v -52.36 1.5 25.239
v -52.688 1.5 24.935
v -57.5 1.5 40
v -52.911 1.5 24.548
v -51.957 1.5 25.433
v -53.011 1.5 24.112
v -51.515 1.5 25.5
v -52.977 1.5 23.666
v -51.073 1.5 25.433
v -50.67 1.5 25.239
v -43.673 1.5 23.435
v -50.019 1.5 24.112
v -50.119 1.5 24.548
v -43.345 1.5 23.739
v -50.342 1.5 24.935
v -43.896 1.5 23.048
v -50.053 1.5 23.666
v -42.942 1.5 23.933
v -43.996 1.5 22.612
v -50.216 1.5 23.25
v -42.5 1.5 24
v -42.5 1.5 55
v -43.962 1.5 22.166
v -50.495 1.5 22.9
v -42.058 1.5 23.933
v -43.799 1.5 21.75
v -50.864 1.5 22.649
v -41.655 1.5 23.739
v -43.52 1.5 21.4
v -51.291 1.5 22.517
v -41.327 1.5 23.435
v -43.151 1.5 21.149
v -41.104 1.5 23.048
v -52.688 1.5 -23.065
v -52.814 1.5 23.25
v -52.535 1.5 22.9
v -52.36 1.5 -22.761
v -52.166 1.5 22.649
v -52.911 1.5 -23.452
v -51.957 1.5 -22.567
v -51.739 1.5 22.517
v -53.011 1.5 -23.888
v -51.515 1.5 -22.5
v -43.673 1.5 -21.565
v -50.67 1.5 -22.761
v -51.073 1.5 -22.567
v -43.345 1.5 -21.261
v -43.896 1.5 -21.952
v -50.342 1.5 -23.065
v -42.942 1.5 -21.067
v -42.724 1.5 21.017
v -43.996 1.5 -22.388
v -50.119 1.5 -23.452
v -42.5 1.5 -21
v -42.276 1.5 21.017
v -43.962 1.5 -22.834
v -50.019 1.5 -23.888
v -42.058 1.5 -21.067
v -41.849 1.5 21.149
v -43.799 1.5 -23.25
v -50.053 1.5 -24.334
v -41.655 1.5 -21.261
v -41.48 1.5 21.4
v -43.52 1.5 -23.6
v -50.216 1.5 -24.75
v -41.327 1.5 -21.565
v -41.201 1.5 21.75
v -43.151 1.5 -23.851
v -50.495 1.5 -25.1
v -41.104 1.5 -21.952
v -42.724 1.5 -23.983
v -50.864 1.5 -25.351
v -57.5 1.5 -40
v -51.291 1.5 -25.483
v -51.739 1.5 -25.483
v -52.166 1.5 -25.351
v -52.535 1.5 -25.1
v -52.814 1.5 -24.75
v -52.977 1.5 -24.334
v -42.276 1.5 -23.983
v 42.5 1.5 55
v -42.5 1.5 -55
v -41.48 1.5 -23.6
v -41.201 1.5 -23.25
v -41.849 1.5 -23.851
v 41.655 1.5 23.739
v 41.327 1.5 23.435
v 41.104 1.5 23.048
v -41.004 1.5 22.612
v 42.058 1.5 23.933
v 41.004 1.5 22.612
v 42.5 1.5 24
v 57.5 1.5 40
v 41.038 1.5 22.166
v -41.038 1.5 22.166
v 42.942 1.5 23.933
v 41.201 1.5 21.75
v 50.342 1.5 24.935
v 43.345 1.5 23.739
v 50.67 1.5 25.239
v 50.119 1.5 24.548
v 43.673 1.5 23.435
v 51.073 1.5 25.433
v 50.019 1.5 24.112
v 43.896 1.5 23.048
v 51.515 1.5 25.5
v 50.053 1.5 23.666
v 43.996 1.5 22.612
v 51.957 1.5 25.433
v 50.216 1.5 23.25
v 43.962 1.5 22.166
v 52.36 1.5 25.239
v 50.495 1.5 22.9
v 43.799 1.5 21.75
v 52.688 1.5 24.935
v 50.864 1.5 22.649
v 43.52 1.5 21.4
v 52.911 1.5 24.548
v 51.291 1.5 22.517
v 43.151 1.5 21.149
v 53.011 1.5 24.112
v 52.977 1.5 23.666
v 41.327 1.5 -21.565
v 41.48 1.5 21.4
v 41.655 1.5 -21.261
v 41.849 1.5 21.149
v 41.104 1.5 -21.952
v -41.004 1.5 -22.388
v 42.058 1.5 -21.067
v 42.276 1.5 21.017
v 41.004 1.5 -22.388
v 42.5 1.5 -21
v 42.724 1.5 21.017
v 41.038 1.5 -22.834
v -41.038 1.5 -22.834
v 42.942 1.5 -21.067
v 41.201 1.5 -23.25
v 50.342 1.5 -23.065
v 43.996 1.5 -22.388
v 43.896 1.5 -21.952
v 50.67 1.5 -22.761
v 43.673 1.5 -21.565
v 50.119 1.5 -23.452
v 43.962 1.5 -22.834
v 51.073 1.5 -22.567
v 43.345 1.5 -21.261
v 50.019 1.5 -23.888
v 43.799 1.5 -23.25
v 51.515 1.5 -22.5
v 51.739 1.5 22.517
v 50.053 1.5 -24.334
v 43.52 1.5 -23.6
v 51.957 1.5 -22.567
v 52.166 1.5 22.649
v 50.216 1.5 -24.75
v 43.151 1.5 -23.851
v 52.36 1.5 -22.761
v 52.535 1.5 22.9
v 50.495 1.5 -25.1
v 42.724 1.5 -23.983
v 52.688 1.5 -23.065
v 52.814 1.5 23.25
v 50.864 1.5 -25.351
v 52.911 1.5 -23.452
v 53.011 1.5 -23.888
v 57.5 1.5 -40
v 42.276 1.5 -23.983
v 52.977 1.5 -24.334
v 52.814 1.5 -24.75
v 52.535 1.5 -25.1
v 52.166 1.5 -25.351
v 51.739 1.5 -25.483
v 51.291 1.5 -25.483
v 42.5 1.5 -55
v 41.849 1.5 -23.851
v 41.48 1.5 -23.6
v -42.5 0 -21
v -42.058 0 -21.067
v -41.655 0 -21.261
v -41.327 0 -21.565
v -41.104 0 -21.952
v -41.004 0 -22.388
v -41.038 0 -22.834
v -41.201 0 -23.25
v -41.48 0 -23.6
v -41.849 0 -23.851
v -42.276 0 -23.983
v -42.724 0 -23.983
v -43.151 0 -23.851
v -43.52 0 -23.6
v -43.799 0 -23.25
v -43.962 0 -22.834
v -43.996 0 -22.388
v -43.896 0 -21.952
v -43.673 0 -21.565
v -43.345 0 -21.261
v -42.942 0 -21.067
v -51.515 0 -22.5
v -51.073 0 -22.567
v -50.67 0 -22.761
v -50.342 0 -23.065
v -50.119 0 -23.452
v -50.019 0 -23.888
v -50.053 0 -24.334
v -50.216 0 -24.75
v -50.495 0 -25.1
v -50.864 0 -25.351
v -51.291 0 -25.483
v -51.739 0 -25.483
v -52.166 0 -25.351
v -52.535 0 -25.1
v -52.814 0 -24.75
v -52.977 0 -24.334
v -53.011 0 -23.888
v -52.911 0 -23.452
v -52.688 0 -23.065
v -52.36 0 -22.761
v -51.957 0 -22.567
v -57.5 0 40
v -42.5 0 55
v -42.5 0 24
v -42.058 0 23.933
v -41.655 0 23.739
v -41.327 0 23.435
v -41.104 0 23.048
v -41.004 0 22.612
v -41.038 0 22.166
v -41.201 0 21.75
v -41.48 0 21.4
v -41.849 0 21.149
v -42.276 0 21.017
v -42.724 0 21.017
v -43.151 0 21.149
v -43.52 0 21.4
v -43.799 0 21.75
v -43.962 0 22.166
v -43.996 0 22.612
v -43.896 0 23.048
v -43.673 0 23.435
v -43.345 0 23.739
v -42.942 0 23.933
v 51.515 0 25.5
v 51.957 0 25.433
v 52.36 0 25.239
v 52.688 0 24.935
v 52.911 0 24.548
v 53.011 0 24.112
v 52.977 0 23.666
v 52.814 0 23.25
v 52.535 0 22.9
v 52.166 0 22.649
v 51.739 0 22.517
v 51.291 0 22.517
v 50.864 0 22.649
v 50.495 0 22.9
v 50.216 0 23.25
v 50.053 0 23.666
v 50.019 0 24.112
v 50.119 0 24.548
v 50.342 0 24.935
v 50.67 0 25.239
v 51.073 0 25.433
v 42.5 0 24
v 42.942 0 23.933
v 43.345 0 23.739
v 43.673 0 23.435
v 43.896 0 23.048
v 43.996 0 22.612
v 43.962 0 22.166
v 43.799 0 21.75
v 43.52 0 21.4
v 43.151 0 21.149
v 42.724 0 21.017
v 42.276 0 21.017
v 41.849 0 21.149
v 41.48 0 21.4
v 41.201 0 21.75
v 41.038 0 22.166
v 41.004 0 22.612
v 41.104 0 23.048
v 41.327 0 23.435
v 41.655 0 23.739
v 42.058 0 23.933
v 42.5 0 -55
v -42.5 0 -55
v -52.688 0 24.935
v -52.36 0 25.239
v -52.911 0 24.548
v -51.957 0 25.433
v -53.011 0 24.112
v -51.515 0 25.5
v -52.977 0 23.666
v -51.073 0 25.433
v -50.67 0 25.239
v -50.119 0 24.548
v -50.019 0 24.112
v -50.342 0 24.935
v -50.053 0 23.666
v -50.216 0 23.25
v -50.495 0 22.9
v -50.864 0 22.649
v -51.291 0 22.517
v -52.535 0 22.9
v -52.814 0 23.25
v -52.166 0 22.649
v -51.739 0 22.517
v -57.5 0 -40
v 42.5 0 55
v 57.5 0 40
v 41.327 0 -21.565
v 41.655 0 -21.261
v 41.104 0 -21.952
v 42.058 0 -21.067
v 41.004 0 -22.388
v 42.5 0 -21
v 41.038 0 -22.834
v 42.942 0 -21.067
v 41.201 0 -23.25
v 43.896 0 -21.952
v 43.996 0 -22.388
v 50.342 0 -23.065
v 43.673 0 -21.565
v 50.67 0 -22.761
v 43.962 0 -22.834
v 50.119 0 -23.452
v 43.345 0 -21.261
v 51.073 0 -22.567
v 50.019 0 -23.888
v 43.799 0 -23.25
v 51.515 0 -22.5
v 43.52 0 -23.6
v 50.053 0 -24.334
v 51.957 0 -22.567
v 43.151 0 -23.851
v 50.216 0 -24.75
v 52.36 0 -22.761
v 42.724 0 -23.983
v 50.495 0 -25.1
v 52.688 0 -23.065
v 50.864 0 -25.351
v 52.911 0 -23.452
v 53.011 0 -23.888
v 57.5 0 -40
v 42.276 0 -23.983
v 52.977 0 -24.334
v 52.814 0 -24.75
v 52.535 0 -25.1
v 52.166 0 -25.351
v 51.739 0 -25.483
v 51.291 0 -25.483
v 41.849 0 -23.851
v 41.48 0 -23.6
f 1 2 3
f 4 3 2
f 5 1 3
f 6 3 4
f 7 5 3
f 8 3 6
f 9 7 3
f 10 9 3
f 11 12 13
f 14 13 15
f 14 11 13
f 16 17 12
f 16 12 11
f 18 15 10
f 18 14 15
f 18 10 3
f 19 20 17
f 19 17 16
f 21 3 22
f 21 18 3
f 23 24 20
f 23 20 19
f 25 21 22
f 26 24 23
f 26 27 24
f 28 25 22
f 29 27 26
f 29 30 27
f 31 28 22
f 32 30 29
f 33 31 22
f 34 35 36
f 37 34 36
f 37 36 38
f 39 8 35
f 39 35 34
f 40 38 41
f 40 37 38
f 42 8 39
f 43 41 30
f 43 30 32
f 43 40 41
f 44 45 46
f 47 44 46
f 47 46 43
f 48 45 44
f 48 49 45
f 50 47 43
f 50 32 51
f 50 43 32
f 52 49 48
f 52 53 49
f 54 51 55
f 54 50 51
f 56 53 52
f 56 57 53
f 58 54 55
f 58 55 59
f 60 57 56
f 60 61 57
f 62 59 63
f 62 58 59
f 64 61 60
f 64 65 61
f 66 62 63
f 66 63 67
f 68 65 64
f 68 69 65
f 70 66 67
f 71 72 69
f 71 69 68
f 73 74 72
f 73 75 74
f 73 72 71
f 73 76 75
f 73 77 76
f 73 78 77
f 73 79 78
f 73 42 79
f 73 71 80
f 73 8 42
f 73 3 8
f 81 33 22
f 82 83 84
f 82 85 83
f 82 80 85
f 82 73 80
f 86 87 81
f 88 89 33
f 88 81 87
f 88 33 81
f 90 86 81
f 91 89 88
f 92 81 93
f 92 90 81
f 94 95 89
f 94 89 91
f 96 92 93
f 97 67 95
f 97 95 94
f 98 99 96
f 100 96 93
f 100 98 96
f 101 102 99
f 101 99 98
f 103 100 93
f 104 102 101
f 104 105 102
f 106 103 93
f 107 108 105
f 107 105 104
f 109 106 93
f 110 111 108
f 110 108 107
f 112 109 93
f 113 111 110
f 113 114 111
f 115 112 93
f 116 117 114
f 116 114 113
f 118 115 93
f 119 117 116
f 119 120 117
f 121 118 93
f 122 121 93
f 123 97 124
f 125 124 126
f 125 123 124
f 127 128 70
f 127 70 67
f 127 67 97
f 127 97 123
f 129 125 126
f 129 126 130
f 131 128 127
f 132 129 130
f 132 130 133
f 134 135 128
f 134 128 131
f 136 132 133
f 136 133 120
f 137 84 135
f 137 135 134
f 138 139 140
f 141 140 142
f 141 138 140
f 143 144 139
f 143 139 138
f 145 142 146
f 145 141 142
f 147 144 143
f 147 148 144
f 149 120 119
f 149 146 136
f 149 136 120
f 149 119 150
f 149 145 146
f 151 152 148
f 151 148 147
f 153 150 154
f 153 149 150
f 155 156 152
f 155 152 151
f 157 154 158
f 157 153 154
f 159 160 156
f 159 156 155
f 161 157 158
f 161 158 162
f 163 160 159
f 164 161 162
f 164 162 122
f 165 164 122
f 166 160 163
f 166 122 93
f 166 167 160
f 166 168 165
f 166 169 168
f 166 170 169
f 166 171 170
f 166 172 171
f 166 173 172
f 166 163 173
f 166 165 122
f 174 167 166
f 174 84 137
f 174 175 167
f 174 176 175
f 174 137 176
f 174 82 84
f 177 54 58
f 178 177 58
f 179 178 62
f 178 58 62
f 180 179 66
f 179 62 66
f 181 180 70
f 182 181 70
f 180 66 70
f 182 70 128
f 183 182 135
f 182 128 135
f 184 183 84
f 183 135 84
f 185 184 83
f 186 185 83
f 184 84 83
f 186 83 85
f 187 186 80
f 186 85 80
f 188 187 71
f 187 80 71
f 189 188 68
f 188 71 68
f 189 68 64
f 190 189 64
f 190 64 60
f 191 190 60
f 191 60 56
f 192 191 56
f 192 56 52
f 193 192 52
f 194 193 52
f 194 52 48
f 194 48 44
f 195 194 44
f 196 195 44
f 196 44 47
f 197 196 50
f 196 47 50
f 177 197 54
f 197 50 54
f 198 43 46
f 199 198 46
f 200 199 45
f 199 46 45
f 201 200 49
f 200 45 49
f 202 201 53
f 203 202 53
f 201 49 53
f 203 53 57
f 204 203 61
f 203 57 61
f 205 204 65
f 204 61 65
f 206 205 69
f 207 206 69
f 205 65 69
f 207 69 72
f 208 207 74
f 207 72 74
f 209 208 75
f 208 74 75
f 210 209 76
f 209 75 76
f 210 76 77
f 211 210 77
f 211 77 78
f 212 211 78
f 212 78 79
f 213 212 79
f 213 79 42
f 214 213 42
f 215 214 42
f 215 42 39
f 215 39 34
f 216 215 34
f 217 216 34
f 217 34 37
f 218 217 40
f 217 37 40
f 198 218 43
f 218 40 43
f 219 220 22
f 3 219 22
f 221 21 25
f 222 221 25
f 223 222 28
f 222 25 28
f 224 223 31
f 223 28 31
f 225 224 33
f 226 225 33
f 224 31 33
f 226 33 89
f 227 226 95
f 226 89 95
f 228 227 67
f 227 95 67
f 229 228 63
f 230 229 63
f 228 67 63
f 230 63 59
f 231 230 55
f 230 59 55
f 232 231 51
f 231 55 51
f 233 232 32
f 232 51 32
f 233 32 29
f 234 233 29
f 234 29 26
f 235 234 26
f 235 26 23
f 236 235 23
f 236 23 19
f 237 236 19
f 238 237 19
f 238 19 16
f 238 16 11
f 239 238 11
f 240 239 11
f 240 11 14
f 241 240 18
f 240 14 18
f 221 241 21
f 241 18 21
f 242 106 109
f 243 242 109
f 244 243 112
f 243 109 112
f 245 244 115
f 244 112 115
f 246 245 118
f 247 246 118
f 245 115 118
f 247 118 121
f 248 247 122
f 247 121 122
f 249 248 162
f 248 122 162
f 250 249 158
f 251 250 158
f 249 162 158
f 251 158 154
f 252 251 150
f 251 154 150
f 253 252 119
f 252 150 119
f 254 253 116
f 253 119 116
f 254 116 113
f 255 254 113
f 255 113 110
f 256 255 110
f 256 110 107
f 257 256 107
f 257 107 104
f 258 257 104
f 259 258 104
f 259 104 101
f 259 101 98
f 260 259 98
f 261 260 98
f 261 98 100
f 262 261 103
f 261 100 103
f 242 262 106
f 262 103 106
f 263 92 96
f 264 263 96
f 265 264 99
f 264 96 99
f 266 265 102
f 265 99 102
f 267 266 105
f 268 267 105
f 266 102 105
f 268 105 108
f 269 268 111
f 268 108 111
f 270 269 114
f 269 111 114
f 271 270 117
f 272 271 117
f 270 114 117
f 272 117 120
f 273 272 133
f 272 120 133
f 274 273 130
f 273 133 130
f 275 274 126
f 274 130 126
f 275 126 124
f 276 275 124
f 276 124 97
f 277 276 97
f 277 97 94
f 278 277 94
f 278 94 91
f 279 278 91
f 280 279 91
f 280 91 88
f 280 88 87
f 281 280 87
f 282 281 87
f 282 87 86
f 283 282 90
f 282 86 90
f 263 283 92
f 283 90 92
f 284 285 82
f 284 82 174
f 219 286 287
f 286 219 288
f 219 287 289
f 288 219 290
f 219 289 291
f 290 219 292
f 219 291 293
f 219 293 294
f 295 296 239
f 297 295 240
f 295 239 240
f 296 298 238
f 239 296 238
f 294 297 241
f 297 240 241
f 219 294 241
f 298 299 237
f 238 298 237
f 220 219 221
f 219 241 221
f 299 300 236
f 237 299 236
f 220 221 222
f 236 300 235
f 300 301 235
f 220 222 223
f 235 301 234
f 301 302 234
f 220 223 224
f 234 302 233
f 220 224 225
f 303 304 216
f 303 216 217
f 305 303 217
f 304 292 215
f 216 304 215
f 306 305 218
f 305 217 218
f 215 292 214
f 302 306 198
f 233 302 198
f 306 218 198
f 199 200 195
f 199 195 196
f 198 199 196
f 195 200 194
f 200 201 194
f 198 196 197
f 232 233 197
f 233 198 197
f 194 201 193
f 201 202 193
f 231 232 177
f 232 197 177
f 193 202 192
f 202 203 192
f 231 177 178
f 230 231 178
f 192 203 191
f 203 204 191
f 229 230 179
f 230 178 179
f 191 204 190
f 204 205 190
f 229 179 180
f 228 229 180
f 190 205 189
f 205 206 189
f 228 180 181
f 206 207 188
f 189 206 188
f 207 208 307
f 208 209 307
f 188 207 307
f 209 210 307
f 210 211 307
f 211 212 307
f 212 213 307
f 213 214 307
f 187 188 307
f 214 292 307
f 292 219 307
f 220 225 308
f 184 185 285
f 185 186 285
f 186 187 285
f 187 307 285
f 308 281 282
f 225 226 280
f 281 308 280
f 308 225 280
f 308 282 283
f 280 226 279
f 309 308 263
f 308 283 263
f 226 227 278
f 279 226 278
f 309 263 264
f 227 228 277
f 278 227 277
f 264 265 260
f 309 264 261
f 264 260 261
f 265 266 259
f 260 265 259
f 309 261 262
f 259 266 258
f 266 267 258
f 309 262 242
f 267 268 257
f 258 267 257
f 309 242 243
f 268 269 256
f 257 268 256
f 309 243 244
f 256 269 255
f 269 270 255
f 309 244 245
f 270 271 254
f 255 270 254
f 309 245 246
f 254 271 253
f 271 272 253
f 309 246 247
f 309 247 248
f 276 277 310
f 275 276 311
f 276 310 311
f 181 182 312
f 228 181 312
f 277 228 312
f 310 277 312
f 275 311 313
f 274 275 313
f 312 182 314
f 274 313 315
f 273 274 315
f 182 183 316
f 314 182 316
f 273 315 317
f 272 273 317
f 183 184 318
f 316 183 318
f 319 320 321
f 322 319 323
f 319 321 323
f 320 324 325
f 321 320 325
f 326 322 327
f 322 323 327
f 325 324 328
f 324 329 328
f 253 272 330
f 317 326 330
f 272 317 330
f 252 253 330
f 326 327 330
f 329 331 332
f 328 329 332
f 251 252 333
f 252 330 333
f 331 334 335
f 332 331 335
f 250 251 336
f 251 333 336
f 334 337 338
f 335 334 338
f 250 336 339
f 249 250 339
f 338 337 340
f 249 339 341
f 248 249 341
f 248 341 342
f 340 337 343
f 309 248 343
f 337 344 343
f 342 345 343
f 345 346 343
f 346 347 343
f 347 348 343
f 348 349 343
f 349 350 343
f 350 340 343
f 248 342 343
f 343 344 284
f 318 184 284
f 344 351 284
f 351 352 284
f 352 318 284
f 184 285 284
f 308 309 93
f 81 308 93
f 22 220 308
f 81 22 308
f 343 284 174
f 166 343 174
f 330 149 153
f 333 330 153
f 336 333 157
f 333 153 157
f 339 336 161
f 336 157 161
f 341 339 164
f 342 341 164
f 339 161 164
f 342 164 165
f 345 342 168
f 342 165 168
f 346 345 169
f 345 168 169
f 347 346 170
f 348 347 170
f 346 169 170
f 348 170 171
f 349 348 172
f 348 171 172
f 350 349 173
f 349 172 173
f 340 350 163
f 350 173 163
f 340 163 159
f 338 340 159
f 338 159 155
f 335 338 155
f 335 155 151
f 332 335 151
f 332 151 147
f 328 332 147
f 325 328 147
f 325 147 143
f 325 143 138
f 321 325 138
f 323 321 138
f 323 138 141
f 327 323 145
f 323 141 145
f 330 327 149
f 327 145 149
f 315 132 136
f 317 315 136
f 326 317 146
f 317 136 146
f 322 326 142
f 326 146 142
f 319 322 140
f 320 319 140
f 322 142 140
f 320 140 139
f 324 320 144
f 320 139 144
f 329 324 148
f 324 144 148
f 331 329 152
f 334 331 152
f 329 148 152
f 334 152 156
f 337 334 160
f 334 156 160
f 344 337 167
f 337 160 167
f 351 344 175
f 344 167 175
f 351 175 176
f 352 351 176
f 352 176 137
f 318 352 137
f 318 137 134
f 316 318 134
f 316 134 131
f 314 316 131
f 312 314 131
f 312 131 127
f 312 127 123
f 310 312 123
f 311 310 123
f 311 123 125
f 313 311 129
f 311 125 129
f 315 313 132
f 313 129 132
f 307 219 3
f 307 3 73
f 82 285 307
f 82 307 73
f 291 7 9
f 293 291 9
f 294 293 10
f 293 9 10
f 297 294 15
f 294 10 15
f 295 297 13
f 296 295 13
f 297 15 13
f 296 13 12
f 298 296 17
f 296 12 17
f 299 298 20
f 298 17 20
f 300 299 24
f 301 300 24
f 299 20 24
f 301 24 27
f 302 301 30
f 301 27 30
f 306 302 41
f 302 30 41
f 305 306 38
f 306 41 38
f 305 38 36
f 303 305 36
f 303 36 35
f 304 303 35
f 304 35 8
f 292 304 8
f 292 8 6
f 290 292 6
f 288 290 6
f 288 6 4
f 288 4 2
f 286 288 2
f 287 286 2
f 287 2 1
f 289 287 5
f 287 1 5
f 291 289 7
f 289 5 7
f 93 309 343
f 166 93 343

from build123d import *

# Parameters (mm, degrees)
SKETCH1_W           = 115
SKETCH1_H           = 110
BOSS_EXTRUDE1_DEPTH = 1.5
CHAMFER1_SIZE       = 15
SKETCH3_R           = 1.5
CUT_EXTRUDE1_DEPTH  = 1.5
SKETCH4_R           = 1.5
CUT_EXTRUDE2_DEPTH  = 1.5


with BuildPart() as part:
    # Sketch1 → Boss-Extrude1 (new body)
    with BuildSketch(Plane(origin=(0, 0, 0), x_dir=(1, 0, 0), z_dir=(0, 1, 0))):
        Rectangle(SKETCH1_W, SKETCH1_H)
    extrude(amount=BOSS_EXTRUDE1_DEPTH)

    # Chamfer1
    chamfer1_edges = [part.edges().sort_by_distance(p)[0] for p in [
        (57.5, 0.75, 55),
        (-57.5, 0.75, 55),
        (-57.5, 0.75, -55),
        (57.5, 0.75, -55),
    ]]
    chamfer(chamfer1_edges, length=CHAMFER1_SIZE)

    # Sketch3 → Cut-Extrude1 (cut)
    with BuildSketch(Plane(origin=(0, 1.5, 0), x_dir=(1, 0, 0), z_dir=(0, 1, 0))):
        with Locations(Location((-51.515, 24, 0), (0, 0, 270))):
            Circle(SKETCH3_R)
        with Locations(Location((51.515, 24, 0), (0, 0, 270))):
            Circle(SKETCH3_R)
        with Locations(Location((51.515, -24, 0), (0, 0, 270))):
            Circle(SKETCH3_R)
        with Locations(Location((-51.515, -24, 0), (0, 0, 270))):
            Circle(SKETCH3_R)
    extrude(amount=-CUT_EXTRUDE1_DEPTH, mode=Mode.SUBTRACT)

    # Sketch4 → Cut-Extrude2 (cut)
    with BuildSketch(Plane(origin=(0, 1.5, 0), x_dir=(1, 0, 0), z_dir=(0, 1, 0))):
        with Locations(Location((-42.5, 22.5, 0), (0, 0, 270))):
            Circle(SKETCH4_R)
        with Locations(Location((-42.5, -22.5, 0), (0, 0, 270))):
            Circle(SKETCH4_R)
        with Locations(Location((42.5, -22.5, 0), (0, 0, 270))):
            Circle(SKETCH4_R)
        with Locations(Location((42.5, 22.5, 0), (0, 0, 270))):
            Circle(SKETCH4_R)
    extrude(amount=-CUT_EXTRUDE2_DEPTH, mode=Mode.SUBTRACT)


solid = part.part
